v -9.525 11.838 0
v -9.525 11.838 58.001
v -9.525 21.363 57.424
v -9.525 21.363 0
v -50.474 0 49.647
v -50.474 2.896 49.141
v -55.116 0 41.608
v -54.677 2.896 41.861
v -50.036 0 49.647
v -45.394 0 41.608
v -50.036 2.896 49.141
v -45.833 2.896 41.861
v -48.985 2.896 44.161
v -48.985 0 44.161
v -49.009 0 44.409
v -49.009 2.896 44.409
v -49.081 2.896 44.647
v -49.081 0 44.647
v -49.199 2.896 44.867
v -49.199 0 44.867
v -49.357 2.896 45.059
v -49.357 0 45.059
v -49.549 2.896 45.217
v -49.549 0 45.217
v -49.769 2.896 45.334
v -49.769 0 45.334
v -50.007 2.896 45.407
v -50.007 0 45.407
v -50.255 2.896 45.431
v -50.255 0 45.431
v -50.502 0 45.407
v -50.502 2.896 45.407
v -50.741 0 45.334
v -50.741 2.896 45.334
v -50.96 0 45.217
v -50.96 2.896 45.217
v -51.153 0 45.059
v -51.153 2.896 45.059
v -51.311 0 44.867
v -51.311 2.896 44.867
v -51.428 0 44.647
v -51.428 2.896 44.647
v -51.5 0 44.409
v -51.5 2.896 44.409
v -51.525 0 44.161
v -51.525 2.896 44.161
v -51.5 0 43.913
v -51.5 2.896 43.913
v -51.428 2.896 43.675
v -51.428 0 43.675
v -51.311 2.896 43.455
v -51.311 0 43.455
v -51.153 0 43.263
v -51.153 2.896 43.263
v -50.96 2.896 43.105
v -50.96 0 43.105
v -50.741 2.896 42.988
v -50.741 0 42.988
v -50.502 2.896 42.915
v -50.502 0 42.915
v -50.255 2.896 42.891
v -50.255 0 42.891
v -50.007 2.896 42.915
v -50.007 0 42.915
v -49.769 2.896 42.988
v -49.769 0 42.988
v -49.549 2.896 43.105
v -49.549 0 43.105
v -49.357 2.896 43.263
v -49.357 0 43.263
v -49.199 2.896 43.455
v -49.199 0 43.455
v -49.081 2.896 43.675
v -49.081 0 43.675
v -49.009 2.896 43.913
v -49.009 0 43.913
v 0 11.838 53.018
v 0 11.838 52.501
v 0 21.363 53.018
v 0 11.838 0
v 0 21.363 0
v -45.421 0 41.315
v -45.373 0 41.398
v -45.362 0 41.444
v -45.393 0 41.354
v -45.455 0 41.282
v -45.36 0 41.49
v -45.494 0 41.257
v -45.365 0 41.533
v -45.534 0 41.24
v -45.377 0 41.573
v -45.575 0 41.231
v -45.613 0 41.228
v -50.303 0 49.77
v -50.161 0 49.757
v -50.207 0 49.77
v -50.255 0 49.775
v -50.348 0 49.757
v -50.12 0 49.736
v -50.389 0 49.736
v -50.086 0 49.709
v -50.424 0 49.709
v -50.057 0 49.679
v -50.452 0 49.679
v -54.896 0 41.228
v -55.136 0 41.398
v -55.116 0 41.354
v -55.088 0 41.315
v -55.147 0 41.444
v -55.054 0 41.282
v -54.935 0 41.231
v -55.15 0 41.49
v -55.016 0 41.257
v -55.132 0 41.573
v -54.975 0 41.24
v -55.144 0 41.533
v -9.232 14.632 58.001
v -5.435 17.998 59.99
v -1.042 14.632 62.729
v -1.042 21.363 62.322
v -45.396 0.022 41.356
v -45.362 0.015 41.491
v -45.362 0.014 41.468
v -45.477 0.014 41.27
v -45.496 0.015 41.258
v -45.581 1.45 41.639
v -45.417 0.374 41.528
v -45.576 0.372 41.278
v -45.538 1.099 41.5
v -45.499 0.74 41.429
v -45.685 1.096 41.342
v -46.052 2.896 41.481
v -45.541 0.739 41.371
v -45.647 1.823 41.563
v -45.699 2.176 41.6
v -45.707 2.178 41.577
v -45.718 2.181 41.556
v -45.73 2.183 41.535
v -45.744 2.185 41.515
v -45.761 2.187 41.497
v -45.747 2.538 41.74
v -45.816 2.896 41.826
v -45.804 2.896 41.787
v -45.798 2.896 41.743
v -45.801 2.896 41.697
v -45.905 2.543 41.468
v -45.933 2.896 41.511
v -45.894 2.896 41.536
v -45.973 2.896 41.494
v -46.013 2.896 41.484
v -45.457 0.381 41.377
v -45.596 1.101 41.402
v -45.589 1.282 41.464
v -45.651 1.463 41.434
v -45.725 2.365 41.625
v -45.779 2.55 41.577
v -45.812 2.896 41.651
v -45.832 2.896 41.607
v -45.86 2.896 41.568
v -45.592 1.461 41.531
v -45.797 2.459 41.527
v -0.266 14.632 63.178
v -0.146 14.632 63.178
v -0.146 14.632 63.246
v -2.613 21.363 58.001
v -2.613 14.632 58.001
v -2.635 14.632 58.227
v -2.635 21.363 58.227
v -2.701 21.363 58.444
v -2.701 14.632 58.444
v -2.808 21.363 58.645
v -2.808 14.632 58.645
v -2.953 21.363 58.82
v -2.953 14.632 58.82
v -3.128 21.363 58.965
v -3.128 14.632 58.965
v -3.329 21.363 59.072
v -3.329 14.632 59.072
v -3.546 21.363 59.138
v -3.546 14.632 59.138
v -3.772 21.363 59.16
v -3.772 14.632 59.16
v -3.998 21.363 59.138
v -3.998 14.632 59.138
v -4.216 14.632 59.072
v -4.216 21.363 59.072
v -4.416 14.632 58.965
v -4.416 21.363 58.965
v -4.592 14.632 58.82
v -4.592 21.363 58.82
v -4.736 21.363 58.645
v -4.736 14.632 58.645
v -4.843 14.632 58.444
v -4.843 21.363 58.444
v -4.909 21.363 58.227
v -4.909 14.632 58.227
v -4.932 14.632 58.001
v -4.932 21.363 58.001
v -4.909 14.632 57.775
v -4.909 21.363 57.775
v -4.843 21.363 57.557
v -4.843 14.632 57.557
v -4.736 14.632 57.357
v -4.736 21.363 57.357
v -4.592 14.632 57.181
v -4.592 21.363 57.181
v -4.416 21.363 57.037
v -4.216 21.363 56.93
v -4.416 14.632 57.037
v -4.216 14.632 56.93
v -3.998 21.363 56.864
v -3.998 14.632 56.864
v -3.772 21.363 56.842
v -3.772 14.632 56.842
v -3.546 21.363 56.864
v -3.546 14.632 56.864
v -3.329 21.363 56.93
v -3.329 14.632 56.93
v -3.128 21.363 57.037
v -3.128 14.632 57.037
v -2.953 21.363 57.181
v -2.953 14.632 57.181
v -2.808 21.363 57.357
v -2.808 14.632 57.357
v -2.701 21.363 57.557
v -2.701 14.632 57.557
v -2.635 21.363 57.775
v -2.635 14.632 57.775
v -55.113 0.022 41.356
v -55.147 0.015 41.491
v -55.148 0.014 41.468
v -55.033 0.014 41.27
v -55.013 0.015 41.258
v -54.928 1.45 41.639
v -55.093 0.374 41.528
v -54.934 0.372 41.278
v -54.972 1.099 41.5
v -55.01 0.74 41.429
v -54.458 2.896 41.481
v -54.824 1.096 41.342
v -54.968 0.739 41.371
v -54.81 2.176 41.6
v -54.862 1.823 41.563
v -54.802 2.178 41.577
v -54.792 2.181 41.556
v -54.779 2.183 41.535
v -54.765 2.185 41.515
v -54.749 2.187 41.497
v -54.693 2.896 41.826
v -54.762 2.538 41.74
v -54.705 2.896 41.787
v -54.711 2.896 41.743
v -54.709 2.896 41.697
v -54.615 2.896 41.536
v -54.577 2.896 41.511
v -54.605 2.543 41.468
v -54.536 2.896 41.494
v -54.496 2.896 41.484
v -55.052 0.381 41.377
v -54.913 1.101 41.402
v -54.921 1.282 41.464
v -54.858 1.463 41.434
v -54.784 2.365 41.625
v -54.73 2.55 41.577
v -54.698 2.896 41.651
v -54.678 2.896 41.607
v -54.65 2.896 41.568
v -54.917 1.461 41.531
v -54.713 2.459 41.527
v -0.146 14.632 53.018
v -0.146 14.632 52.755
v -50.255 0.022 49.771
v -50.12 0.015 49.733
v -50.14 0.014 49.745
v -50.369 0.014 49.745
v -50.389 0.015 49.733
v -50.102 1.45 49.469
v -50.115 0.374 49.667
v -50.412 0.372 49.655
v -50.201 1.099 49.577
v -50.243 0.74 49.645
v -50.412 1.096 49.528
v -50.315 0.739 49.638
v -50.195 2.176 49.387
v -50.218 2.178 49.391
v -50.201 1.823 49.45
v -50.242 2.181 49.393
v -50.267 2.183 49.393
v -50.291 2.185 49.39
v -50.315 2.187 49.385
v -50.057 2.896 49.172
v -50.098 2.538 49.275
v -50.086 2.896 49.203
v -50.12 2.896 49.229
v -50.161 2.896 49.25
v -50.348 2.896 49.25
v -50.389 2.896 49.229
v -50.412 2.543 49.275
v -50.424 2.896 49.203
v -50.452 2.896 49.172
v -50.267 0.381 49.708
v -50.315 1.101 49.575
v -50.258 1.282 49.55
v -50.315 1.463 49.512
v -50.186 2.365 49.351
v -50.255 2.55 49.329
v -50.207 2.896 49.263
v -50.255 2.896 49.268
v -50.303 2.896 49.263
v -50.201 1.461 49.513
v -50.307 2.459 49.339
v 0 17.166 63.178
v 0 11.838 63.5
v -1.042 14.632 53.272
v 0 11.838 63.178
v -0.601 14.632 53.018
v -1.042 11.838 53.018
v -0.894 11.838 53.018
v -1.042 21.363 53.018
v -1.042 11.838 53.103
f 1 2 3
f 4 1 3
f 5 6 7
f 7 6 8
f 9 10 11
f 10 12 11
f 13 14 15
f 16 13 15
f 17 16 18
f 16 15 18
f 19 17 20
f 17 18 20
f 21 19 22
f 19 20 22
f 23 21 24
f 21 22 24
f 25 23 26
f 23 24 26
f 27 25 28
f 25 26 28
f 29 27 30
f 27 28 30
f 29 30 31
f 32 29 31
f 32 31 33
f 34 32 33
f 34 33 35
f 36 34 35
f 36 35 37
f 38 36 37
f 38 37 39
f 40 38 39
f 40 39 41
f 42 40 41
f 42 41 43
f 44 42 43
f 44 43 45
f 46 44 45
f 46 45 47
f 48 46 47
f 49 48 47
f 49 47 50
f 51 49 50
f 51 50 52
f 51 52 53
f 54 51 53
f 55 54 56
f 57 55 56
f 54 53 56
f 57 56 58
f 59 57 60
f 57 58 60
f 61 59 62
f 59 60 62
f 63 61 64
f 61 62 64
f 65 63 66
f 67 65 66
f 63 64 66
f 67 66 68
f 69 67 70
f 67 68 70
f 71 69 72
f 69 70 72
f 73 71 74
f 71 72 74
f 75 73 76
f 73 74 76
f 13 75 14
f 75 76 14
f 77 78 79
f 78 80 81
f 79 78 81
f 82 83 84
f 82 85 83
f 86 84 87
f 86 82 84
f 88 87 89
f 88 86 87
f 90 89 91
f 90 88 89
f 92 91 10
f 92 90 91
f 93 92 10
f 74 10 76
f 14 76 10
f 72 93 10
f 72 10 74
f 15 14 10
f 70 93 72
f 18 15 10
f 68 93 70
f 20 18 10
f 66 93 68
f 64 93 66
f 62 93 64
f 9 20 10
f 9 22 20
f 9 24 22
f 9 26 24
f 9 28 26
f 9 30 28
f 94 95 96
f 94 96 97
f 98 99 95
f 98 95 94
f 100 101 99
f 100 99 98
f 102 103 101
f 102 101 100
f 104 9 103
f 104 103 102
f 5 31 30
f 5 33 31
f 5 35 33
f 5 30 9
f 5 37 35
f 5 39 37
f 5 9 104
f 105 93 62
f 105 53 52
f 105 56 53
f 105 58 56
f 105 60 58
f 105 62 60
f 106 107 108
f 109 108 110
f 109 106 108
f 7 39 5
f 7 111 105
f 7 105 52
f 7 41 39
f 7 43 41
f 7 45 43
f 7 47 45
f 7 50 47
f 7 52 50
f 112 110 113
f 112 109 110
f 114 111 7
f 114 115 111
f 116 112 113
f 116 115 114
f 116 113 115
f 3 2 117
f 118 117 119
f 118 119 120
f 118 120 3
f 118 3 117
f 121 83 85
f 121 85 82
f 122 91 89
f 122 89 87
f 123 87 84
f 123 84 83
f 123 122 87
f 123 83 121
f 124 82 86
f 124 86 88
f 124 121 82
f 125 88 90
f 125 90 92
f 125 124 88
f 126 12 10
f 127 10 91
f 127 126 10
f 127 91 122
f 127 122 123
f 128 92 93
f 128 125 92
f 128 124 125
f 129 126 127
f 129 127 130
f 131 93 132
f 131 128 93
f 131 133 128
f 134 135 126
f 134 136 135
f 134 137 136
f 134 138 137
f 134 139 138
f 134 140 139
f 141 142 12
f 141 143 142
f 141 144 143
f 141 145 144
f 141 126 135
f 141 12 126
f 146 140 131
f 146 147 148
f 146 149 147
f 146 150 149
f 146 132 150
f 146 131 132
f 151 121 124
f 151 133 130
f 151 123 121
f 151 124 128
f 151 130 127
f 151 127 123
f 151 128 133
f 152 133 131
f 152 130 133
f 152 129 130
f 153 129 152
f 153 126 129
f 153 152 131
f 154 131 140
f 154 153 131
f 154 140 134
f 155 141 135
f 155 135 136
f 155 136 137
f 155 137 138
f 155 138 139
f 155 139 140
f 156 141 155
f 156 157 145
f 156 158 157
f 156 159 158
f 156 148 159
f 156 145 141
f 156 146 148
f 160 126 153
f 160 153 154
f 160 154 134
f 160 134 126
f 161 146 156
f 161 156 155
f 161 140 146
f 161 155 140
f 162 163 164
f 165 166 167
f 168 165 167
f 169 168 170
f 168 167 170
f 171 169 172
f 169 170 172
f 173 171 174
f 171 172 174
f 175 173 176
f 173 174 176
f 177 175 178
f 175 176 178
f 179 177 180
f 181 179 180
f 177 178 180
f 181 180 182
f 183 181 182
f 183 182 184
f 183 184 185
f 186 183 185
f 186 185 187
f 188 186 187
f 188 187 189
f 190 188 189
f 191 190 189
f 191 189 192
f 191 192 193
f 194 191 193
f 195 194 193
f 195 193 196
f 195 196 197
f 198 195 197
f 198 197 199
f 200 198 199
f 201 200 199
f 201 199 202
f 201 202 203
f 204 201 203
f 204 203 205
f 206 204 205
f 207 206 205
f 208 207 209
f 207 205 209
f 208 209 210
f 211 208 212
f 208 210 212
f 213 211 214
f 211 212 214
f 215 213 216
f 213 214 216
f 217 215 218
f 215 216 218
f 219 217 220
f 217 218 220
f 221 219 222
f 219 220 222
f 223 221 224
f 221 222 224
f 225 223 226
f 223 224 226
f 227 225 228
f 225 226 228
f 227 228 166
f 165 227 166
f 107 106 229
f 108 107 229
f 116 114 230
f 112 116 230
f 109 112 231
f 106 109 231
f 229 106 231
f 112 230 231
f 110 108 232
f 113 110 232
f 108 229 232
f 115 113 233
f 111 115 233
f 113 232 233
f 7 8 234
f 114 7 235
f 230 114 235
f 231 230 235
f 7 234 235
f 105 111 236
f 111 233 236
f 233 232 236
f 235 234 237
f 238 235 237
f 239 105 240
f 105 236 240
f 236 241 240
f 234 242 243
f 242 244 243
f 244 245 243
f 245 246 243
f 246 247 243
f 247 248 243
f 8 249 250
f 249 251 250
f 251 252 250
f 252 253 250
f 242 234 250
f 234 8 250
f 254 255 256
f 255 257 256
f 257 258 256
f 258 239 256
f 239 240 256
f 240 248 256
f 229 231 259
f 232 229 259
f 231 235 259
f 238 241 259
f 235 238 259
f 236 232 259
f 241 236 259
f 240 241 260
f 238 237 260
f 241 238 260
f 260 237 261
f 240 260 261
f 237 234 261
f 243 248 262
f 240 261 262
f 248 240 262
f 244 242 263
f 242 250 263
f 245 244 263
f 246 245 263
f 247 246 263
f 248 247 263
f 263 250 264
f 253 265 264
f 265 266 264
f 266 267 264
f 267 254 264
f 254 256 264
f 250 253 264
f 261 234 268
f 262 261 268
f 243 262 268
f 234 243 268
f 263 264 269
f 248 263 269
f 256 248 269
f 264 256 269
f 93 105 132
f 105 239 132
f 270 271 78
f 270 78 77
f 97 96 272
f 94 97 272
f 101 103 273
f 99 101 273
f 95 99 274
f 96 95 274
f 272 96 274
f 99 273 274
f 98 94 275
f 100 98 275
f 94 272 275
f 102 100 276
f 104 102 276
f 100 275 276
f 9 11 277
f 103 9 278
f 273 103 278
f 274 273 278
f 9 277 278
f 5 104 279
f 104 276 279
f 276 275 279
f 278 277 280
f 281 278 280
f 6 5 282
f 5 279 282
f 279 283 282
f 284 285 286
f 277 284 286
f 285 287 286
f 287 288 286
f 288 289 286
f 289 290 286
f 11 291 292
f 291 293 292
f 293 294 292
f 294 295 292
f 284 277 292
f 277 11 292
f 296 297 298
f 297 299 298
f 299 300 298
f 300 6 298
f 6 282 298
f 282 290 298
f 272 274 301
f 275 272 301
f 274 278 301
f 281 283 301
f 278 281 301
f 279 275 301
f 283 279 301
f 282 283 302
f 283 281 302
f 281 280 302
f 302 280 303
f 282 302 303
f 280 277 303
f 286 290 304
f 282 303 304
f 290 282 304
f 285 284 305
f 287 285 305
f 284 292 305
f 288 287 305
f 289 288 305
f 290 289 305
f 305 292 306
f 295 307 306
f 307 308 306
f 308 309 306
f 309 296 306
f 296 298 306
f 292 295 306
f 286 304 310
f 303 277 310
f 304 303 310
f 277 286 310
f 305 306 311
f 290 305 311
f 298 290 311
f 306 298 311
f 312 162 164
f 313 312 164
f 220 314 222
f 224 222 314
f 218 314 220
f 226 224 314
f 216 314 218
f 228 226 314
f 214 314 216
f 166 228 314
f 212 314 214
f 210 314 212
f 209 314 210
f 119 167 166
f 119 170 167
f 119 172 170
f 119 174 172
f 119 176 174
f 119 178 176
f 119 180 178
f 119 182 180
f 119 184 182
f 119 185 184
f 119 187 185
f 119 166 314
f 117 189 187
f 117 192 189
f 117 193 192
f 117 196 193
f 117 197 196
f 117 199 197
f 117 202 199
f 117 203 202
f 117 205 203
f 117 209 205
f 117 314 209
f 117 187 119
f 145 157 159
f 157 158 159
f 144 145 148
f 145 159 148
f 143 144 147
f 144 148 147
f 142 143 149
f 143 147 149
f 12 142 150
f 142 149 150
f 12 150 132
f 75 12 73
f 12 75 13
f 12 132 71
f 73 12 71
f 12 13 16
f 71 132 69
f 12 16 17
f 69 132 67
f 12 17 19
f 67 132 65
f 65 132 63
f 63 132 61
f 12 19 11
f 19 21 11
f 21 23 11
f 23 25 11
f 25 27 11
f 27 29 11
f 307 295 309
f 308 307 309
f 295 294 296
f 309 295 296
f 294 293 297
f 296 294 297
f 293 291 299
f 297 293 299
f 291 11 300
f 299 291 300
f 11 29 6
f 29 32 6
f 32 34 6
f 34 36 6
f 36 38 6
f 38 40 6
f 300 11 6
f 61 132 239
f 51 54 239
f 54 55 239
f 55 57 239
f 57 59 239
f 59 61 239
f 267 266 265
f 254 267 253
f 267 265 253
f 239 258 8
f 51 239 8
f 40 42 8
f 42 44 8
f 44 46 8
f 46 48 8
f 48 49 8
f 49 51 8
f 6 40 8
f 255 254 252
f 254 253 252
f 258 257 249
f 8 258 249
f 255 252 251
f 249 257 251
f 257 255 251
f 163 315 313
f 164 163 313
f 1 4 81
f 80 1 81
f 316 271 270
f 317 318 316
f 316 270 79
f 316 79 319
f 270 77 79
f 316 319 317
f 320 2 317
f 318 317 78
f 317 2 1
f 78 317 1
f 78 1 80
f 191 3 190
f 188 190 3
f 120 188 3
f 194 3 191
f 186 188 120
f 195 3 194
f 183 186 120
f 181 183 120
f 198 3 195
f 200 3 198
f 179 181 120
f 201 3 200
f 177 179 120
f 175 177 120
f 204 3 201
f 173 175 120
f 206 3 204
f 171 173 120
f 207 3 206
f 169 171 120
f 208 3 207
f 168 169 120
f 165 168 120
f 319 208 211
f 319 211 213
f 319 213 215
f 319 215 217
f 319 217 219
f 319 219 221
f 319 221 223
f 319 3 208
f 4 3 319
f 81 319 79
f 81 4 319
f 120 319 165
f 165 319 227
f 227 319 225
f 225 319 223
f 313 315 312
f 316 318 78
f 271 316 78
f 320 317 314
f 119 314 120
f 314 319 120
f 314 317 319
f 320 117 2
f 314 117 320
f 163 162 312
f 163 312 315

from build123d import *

# Parameters (mm, degrees)
F0_W      = 9.525
F0_H      = 9.525
F1_DEPTH  = 63.5
F3_DEPTH  = 25.4
F3_TAPER  = -3
F4_DEPTH  = 2.794
F4_TAPER  = 3
F6_DEPTH  = 25.4
F7_DEPTH  = 25.4
F9_DEPTH  = 2.8956
F9_TAPER  = 5
F10_R     = 1.27
F11_DEPTH = 25.4
F12_R     = 0.254
F13_R     = 1.1592302207
F14_DEPTH = 25.4
F15_DEPTH = 25.4


with BuildPart() as f1:
    # F0 (on Top) → F1 (new body)
    with BuildSketch(Plane.XY):
        with Locations((-4.7625, 16.6007144532)):
            Rectangle(F0_W, F0_H)
    extrude(amount=F1_DEPTH)

    # F2 (on face) → F3 (cut)
    with BuildSketch(Plane.XZ.offset(-11.8382144532)):
        Polygon((-9.525, 58.000738686), (0, 63.5), (-9.525, 63.5), align=None)
    extrude(amount=-F3_DEPTH, taper=F3_TAPER, mode=Mode.SUBTRACT)

    # F2 (on face) → F4 (cut)
    with BuildSketch(Plane.XZ.offset(-11.8382144532)):
        Polygon((0, 52.5014773719), (0, 63.5), (-9.525, 58.000738686), align=None)
    extrude(amount=-F4_DEPTH, taper=F4_TAPER, mode=Mode.SUBTRACT)

    # F5 (on face) → F6 (cut)
    with BuildSketch(Plane(origin=(0, 21.3632144532, 0), x_dir=(-1, 0, 0), z_dir=(0, 1, 0))):
        with BuildLine():
            Line((-0.2275896803, 53.0175918537), (0, 53.0175918537))
            Line((0, 53.0175918537), (0, 62.9235918537))
            add(Edge.make_bspline(
                [(0, 62.9235918537), (1.0424103197, 62.321755975)],
                knots=[0, 0, 0.1094394036, 0.1094394036], degree=1))
            Line((1.0424103197, 62.321755975), (1.0424103197, 63.1775918537))
            Line((1.0424103197, 63.1775918537), (-0.2275896803, 63.1775918537))
            Line((-0.2275896803, 63.1775918537), (-0.2275896803, 53.0175918537))
        make_face()
    extrude(amount=F6_DEPTH, mode=Mode.SUBTRACT)

    # F5 (on face) → F7 (cut)
    with BuildSketch(Plane(origin=(0, 21.3632144532, 0), x_dir=(-1, 0, 0), z_dir=(0, 1, 0))):
        with BuildLine():
            Line((0, 62.9235918537), (0, 53.0175918537))
            Line((0, 53.0175918537), (1.0424103197, 53.0175918537))
            Line((1.0424103197, 53.0175918537), (1.0424103197, 62.321755975))
            add(Edge.make_bspline(
                [(0, 62.9235918537), (1.0424103197, 62.321755975)],
                knots=[0, 0, 0.1094394036, 0.1094394036], degree=1))
        make_face()
        with BuildLine():
            Line((-0.2275896803, 53.0175918537), (0, 53.0175918537))
            Line((0, 53.0175918537), (0, 62.9235918537))
            add(Edge.make_bspline(
                [(0, 62.9235918537), (1.0424103197, 62.321755975)],
                knots=[0, 0, 0.1094394036, 0.1094394036], degree=1))
            Line((1.0424103197, 62.321755975), (1.0424103197, 63.1775918537))
            Line((1.0424103197, 63.1775918537), (-0.2275896803, 63.1775918537))
            Line((-0.2275896803, 63.1775918537), (-0.2275896803, 53.0175918537))
        make_face()
    extrude(amount=-F7_DEPTH, mode=Mode.SUBTRACT)

    # F13 (on Front) → F14 (cut)
    with BuildSketch(Plane.XZ):
        with Locations((-3.7723219896, 58.000738686)):
            Circle(F13_R)
    extrude(amount=-F14_DEPTH, mode=Mode.SUBTRACT)

    # F5 (on face) → F15 (cut)
    with BuildSketch(Plane(origin=(0, 21.3632144532, 0), x_dir=(-1, 0, 0), z_dir=(0, 1, 0))):
        with BuildLine():
            Line((0, 62.9235918537), (0, 53.0175918537))
            Line((0, 53.0175918537), (1.0424103197, 53.0175918537))
            Line((1.0424103197, 53.0175918537), (1.0424103197, 62.321755975))
            add(Edge.make_bspline(
                [(0, 62.9235918537), (1.0424103197, 62.321755975)],
                knots=[0, 0, 0.1094394036, 0.1094394036], degree=1))
        make_face()
    extrude(amount=-F15_DEPTH, mode=Mode.SUBTRACT)


with BuildPart() as f9:
    # F8 (on Front) → F9 (new body)
    with BuildSketch(Plane.XZ):
        Polygon((-45.1746919079, 41.2280258131), (-50.2546919079, 50.0268439156), (-55.3346919079, 41.2280258131), align=None)
    extrude(amount=-F9_DEPTH, taper=F9_TAPER)

    # F10 (on face) → F11 (cut)
    with BuildSketch(Plane.XZ):
        with Locations((-50.2546919079, 44.1609651806)):
            Circle(F10_R)
    extrude(amount=-F11_DEPTH, mode=Mode.SUBTRACT)

    # F12
    f12_edges = [f9.edges().sort_by_distance(p)[0] for p in [
        (-50.254692, 1.4478, 49.773512),
        (-55.1153, 1.4478, 41.354692),
        (-45.394084, 1.4478, 41.354692),
    ]]
    fillet(f12_edges, radius=F12_R)


solid = Compound([f1.part, f9.part])
